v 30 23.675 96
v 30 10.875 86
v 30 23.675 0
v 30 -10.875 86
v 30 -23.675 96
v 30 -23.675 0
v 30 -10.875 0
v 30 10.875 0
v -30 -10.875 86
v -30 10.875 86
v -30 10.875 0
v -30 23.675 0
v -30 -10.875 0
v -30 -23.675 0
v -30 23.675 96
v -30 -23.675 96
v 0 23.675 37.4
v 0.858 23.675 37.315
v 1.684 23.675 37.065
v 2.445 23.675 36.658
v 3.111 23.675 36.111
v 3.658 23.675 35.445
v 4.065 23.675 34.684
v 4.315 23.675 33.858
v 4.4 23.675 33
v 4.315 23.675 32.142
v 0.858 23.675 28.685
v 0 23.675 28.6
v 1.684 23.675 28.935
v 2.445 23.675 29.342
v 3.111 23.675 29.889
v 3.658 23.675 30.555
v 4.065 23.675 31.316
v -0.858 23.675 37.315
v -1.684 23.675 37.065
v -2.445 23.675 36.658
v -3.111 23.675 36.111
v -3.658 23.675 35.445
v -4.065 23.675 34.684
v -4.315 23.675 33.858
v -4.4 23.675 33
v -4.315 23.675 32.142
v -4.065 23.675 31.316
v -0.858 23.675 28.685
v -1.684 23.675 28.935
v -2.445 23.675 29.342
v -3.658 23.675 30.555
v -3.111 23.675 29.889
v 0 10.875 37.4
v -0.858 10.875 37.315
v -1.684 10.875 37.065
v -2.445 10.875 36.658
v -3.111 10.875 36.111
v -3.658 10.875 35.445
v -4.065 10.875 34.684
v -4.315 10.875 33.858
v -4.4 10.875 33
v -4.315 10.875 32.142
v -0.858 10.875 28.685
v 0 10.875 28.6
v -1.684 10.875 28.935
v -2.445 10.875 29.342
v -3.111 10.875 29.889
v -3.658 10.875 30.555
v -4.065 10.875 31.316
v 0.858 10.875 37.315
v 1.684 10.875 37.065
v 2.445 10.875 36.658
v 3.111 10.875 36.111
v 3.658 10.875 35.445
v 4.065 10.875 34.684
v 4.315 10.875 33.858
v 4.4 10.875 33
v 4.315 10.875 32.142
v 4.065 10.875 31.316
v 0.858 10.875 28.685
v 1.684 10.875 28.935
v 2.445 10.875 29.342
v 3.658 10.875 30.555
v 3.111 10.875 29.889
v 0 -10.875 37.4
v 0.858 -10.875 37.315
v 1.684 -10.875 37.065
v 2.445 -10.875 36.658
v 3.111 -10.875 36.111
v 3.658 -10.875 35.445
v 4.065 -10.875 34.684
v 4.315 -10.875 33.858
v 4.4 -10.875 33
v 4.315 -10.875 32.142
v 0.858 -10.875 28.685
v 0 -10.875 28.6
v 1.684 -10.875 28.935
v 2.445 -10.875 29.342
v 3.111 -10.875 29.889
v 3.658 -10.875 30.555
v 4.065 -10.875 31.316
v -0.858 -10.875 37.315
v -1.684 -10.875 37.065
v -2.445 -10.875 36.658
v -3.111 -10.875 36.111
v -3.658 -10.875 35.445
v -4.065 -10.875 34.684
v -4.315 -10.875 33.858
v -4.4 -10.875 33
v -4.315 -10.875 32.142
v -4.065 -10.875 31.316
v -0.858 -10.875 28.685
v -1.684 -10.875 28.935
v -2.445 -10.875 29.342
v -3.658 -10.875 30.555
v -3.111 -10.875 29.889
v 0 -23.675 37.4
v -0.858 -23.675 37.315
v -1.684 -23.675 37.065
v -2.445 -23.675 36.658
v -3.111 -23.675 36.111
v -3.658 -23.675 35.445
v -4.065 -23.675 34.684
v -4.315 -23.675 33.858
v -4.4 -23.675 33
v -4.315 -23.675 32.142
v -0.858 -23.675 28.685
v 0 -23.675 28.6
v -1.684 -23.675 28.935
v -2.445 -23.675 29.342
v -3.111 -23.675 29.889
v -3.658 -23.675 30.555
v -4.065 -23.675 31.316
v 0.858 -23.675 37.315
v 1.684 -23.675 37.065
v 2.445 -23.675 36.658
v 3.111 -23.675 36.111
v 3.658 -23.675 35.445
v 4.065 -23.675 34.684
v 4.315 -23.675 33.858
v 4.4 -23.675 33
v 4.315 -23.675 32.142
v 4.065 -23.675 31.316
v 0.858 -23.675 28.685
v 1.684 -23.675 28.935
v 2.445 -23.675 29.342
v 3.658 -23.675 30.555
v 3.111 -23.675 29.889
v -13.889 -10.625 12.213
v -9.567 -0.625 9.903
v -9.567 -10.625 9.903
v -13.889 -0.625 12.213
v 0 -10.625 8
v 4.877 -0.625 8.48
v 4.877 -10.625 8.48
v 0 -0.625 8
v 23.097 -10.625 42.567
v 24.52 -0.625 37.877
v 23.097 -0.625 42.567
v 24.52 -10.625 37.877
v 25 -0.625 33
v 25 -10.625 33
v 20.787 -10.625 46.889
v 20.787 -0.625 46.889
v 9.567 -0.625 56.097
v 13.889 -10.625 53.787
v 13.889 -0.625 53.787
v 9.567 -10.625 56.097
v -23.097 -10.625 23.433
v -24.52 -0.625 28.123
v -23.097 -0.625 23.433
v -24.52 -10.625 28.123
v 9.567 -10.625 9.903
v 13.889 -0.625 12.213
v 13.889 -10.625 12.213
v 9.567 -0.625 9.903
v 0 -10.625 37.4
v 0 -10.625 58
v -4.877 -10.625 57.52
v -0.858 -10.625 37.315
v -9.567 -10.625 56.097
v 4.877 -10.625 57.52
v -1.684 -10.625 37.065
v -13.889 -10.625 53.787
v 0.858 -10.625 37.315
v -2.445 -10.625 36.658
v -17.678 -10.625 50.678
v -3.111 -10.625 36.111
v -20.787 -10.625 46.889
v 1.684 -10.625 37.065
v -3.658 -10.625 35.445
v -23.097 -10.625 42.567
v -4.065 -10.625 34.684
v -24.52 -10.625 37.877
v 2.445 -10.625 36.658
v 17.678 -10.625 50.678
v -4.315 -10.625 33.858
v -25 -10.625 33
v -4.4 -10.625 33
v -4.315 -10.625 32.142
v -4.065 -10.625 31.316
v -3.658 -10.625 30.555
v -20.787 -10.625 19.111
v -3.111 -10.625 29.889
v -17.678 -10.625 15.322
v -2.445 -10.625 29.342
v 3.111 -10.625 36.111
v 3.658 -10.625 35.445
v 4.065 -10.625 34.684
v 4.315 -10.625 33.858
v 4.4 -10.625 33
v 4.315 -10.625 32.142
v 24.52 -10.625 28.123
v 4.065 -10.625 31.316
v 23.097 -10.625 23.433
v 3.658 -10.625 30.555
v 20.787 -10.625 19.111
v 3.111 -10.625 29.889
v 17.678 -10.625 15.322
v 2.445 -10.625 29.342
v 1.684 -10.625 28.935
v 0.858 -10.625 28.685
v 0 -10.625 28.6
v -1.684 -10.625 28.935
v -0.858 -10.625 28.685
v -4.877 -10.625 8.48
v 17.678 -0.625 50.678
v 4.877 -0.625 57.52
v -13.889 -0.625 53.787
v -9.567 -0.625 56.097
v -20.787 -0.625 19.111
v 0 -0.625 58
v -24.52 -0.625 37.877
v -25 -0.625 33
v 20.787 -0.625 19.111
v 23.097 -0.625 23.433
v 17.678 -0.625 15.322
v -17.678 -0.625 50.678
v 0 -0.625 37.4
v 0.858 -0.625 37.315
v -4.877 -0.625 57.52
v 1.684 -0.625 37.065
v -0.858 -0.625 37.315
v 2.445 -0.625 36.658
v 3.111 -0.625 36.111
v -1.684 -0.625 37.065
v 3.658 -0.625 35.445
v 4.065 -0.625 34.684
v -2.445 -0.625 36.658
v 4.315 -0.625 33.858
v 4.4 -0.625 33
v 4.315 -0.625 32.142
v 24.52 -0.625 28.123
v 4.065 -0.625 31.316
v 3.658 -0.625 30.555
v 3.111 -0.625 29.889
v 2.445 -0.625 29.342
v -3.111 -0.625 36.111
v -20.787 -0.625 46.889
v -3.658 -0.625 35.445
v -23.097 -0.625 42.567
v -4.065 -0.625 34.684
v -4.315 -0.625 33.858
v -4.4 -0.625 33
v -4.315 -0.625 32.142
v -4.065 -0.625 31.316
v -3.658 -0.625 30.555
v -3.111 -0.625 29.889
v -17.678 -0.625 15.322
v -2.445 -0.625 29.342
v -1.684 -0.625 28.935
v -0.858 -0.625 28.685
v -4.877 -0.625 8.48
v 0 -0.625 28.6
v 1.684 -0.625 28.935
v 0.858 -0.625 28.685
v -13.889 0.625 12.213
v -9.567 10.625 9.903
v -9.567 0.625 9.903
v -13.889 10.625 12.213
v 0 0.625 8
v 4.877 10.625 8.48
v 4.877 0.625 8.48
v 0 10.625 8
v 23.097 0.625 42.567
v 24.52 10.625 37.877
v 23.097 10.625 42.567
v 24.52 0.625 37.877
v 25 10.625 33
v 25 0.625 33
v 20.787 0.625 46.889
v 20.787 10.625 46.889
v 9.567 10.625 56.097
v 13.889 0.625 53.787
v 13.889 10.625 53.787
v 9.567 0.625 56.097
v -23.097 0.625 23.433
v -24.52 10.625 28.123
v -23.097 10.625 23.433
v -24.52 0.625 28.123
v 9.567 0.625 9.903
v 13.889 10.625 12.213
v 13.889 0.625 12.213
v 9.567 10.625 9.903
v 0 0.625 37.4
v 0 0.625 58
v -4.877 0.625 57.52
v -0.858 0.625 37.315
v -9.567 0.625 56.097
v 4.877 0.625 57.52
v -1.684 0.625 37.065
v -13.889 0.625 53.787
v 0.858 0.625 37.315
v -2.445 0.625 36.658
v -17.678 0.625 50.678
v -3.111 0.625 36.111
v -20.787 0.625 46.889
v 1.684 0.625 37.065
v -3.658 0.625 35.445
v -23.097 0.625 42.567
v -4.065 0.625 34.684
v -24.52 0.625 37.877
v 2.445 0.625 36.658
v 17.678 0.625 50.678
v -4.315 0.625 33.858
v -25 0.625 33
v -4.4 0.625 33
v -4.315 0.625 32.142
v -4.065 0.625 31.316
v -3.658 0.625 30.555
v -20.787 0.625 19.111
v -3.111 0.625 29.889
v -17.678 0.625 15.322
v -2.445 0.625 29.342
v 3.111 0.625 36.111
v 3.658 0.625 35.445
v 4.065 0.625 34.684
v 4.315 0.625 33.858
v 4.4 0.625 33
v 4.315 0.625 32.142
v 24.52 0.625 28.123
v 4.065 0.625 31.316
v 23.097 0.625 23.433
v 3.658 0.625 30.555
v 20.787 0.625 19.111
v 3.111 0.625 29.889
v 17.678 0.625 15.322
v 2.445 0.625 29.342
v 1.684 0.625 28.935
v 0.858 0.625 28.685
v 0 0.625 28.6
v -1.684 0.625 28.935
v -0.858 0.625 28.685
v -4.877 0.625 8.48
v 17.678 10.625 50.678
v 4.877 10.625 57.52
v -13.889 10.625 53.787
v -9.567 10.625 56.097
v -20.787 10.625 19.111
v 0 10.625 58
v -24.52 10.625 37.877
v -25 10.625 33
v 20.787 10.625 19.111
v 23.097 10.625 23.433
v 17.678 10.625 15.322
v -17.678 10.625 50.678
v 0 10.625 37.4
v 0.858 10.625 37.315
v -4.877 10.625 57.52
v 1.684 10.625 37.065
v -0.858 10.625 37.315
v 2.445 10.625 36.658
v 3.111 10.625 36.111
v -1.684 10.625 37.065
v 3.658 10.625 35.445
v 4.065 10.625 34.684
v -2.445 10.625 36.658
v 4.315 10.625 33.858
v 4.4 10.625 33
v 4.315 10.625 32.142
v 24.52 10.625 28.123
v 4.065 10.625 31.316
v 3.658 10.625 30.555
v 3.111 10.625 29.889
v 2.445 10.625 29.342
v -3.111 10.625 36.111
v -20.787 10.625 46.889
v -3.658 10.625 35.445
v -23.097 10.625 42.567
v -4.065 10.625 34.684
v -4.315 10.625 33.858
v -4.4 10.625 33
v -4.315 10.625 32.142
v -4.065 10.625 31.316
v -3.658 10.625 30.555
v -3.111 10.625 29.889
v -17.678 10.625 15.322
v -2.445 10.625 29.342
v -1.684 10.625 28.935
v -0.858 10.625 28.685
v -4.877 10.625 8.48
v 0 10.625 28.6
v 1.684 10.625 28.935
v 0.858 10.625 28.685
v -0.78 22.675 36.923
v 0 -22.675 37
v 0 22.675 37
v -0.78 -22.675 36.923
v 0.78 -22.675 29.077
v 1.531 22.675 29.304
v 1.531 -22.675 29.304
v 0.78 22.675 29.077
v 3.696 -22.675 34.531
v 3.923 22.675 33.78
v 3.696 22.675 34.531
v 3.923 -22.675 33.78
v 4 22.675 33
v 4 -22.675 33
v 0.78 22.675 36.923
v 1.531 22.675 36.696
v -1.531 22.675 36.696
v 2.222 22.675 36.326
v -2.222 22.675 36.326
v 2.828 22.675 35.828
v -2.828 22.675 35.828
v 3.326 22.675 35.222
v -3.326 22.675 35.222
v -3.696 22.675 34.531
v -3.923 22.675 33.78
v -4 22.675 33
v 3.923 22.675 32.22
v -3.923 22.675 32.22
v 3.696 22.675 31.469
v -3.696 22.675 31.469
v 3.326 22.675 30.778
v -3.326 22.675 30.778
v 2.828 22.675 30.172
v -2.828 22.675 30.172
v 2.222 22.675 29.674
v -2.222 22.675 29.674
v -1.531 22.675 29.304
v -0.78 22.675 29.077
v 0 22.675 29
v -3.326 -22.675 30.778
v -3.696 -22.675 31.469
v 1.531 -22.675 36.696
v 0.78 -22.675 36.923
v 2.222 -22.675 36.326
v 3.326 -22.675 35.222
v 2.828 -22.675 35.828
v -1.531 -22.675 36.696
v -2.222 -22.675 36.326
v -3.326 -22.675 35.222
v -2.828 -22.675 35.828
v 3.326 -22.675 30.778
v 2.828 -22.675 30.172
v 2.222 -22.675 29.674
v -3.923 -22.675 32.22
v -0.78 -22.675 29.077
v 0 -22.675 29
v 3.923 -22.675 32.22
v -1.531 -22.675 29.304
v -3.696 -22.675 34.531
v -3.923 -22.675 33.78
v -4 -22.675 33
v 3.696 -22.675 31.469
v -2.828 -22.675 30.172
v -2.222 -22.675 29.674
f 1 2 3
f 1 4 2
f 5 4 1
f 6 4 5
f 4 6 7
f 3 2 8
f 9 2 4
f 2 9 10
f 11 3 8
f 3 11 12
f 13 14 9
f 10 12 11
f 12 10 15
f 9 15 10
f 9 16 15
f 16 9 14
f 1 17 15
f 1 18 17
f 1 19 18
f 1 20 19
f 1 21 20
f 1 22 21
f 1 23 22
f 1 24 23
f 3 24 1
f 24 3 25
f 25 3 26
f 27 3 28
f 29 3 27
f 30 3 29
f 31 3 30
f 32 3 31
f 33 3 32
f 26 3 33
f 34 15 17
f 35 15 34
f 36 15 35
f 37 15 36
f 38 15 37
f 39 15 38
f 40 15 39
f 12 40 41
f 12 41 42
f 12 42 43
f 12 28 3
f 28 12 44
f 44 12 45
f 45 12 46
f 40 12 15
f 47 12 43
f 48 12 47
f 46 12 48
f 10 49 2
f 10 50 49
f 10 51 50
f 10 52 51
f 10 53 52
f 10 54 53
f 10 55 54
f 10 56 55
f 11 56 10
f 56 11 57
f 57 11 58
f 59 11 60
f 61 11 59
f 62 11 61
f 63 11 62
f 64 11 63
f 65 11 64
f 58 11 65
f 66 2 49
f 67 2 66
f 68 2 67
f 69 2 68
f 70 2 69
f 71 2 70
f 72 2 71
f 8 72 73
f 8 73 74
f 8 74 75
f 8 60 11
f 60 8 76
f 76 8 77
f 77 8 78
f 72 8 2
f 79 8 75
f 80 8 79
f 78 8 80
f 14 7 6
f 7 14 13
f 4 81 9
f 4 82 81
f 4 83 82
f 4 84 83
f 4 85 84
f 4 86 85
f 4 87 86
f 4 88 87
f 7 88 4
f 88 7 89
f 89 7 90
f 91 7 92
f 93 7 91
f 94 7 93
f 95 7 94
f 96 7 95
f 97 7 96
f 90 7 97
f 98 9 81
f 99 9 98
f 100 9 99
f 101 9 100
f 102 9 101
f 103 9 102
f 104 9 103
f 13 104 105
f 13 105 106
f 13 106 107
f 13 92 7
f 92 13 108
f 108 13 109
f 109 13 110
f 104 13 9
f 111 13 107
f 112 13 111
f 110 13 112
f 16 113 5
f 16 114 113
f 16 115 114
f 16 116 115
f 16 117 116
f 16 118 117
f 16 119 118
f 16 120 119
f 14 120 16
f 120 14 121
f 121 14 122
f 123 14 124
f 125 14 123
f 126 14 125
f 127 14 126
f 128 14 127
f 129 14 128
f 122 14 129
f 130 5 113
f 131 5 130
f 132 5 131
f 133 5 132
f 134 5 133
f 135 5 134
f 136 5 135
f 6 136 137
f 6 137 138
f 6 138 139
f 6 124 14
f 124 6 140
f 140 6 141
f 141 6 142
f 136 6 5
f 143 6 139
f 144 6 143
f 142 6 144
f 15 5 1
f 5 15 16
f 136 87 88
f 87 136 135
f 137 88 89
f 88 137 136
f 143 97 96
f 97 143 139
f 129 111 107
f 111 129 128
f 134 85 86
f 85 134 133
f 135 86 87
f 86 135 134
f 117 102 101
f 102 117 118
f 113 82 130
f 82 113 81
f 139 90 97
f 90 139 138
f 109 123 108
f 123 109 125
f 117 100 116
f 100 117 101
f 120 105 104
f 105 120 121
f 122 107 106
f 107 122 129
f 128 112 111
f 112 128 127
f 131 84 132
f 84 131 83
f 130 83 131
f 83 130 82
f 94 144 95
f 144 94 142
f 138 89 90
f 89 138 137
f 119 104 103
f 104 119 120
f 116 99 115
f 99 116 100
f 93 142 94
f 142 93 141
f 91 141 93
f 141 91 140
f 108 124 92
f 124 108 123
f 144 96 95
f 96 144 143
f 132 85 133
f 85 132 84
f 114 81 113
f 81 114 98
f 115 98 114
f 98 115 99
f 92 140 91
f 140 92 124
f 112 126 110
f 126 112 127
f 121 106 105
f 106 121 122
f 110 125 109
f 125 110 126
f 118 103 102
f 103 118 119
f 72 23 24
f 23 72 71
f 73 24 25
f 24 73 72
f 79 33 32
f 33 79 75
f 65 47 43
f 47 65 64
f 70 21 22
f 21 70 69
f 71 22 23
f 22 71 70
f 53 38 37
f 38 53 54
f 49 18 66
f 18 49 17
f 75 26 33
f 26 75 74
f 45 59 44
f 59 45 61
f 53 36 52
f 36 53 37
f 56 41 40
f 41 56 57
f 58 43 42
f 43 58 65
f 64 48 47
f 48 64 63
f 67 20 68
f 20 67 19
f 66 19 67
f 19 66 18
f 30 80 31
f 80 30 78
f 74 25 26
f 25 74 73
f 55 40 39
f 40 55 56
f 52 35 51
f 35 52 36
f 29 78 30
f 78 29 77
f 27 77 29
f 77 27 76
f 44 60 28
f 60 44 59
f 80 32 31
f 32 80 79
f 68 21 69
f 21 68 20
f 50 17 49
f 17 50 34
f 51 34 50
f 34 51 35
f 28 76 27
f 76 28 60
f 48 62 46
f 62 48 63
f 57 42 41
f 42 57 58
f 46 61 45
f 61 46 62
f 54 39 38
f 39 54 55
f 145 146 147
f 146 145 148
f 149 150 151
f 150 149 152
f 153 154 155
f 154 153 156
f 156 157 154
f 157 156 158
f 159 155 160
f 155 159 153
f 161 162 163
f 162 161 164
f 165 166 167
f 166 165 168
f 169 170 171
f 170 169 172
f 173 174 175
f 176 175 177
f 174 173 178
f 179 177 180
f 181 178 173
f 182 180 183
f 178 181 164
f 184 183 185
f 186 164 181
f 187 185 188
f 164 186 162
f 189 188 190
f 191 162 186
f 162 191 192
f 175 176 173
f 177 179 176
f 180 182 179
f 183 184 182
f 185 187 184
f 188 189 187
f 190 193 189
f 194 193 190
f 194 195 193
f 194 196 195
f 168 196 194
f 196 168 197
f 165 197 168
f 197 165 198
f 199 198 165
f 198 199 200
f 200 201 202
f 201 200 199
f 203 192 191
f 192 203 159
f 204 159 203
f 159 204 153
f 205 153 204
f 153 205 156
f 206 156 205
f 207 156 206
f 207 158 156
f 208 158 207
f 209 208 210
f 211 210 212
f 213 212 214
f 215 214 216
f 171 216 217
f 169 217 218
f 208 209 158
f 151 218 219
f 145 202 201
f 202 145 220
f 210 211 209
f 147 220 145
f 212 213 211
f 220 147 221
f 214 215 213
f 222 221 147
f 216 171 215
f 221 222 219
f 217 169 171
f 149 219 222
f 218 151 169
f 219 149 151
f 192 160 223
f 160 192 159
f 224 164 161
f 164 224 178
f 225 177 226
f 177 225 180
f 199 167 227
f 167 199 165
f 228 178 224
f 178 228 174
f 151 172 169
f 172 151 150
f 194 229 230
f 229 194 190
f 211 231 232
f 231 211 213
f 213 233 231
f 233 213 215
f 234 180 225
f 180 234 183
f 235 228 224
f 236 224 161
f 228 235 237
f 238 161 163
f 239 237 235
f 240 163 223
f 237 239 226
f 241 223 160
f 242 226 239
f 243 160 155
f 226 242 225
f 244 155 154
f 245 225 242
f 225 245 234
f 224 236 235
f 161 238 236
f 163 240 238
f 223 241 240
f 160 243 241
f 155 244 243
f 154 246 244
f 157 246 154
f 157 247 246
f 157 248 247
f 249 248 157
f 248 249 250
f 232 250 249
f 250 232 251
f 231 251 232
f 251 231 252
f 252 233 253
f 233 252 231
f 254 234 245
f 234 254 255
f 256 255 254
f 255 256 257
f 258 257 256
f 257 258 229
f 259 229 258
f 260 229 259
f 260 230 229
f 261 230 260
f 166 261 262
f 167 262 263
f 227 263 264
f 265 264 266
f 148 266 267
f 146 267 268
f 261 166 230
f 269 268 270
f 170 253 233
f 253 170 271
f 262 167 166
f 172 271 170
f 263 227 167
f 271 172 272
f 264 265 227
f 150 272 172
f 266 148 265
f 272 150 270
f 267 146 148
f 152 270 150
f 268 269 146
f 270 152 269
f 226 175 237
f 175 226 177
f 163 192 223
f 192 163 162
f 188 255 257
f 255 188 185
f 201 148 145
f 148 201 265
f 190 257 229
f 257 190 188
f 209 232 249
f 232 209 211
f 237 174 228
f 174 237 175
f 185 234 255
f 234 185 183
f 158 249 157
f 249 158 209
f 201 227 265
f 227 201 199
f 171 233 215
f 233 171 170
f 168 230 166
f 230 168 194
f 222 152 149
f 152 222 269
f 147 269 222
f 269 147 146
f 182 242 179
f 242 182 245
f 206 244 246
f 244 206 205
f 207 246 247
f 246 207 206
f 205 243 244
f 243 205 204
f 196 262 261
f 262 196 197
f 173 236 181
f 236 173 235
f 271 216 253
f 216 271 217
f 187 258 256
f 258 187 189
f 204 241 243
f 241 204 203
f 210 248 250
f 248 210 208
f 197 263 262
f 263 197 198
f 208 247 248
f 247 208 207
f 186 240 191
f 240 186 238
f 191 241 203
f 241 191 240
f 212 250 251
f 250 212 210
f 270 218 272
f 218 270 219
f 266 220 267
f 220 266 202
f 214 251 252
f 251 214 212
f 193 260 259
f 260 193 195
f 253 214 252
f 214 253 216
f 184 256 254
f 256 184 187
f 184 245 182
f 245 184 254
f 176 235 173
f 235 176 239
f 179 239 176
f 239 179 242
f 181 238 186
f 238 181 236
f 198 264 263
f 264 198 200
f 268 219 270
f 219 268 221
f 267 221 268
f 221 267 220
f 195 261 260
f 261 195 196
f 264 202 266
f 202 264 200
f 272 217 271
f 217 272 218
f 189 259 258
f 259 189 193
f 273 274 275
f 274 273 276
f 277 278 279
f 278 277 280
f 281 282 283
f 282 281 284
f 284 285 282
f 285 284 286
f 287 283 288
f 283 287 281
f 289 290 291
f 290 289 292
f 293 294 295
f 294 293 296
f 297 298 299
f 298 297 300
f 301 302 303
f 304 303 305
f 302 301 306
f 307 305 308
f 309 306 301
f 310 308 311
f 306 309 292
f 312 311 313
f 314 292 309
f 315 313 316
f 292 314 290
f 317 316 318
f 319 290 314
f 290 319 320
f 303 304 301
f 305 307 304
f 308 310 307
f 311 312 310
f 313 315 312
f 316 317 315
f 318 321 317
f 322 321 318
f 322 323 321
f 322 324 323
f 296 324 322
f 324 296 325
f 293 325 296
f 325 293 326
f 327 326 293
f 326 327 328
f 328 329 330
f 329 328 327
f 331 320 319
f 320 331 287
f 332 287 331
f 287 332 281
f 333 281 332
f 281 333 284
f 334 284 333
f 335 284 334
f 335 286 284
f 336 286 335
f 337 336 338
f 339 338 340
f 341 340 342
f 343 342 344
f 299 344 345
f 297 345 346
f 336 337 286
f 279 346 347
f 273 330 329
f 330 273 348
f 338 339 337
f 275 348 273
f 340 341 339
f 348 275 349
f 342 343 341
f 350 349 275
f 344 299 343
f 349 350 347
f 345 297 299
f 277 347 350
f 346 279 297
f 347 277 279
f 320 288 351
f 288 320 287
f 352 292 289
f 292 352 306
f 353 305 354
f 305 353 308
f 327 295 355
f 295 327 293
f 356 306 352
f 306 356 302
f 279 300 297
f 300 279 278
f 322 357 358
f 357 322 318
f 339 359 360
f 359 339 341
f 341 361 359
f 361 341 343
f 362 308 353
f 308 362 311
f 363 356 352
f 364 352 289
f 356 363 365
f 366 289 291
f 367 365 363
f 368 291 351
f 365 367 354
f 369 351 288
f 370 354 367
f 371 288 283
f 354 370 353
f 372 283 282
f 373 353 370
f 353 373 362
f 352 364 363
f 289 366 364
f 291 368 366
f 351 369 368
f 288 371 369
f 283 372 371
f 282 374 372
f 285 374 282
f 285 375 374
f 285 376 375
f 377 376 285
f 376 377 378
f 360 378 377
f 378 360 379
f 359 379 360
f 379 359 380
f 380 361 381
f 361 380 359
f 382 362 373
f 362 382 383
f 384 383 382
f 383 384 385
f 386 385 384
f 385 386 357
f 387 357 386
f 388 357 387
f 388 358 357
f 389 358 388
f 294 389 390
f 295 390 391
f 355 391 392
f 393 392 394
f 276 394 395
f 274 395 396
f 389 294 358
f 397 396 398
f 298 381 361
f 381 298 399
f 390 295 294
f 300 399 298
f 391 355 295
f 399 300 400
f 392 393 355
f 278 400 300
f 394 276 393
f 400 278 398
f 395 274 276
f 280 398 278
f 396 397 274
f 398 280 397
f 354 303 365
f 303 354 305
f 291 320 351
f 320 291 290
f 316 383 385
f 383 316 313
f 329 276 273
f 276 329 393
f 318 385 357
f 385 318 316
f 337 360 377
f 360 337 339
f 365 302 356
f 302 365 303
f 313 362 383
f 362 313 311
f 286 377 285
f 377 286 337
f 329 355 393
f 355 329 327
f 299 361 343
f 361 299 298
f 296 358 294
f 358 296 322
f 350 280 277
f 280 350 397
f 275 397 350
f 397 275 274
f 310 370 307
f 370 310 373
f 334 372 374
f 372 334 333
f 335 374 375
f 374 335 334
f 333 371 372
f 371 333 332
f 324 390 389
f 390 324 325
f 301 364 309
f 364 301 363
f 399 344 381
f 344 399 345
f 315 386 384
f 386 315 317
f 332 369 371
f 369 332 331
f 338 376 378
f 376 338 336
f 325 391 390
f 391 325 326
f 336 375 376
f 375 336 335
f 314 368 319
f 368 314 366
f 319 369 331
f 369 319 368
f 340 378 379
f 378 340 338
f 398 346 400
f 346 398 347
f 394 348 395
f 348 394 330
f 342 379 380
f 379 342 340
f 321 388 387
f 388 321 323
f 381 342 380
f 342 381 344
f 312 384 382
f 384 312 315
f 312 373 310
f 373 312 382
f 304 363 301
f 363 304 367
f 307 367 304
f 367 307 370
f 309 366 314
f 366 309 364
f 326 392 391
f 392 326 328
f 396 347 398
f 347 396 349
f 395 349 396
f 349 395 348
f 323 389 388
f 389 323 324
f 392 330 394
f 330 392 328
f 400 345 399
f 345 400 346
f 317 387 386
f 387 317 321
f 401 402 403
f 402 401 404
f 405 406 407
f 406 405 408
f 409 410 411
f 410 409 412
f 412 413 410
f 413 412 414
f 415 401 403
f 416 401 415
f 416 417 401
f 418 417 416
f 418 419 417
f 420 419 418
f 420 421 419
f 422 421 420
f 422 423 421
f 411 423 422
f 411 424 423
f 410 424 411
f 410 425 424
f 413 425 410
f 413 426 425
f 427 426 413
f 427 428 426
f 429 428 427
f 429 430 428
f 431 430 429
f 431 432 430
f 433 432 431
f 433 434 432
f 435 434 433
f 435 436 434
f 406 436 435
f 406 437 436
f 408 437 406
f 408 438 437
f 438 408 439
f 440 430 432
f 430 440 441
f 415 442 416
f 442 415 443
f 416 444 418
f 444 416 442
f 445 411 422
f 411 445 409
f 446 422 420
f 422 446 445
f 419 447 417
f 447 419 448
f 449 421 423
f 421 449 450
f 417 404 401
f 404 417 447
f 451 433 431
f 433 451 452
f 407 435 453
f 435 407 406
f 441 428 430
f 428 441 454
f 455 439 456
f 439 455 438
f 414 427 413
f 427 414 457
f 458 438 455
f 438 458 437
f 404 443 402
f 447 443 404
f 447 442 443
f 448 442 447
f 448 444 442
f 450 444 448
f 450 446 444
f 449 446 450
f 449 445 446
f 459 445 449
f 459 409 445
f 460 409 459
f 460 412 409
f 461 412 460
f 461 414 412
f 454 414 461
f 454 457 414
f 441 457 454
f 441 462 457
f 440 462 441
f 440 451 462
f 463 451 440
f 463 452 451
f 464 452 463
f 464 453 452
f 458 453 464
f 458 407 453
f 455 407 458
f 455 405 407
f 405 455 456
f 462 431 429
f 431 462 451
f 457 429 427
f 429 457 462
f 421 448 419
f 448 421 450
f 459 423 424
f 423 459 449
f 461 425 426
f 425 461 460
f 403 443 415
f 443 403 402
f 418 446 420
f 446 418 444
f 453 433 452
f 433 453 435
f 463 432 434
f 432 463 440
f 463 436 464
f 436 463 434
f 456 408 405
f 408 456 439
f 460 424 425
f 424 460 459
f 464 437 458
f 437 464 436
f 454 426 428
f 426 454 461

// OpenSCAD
$fn = 32;

// ------------------------------------------------------------------------
// Trolley wheel set: wheels d50, fork 86 mm tall
// Every part is its own module, assembly() places every instance.
// ------------------------------------------------------------------------

// --- part 1 ---
module trolley_fork() {
  difference() {
    union() {
      translate([-30, 10.875, 0]) cube([60, 12.8, 86]);
      translate([-30, -23.675, 0]) cube([60, 12.8, 86]);
      translate([-30, -23.675, 86]) cube([60, 47.35, 10]);
    }
    translate([0, -17.275, 33]) rotate([90, 0, 0]) cylinder(h = 14.8, d = 8.8, center = true);
    translate([0, 17.275, 33]) rotate([90, 0, 0]) cylinder(h = 14.8, d = 8.8, center = true);
  }
}

// --- part 2 ---
module trolley_wheel() {
  difference() {
      translate([0, 0, 0]) cylinder(h = 10, d = 50);
      translate([0, 0, -1]) cylinder(h = 12, d = 8.8);
    }
}

// --- part 3 ---
module trolley_axle() {
  translate([0, 0, -22.675]) cylinder(h = 45.35, d = 8);
}

// --- assembly ---
module assembly() {
  color([0.80, 0.24, 0.20]) translate([0, 0, 0]) rotate([0, 0, 0]) trolley_fork();
  color([0.20, 0.45, 0.75]) translate([0, -0.625, 33]) rotate([90, 0, 0]) trolley_wheel();
  color([0.25, 0.62, 0.32]) translate([0, 10.625, 33]) rotate([90, 0, 0]) trolley_wheel();
  color([0.92, 0.70, 0.18]) translate([0, 0, 33]) rotate([90, 0, 0]) trolley_axle();
}

assembly();
